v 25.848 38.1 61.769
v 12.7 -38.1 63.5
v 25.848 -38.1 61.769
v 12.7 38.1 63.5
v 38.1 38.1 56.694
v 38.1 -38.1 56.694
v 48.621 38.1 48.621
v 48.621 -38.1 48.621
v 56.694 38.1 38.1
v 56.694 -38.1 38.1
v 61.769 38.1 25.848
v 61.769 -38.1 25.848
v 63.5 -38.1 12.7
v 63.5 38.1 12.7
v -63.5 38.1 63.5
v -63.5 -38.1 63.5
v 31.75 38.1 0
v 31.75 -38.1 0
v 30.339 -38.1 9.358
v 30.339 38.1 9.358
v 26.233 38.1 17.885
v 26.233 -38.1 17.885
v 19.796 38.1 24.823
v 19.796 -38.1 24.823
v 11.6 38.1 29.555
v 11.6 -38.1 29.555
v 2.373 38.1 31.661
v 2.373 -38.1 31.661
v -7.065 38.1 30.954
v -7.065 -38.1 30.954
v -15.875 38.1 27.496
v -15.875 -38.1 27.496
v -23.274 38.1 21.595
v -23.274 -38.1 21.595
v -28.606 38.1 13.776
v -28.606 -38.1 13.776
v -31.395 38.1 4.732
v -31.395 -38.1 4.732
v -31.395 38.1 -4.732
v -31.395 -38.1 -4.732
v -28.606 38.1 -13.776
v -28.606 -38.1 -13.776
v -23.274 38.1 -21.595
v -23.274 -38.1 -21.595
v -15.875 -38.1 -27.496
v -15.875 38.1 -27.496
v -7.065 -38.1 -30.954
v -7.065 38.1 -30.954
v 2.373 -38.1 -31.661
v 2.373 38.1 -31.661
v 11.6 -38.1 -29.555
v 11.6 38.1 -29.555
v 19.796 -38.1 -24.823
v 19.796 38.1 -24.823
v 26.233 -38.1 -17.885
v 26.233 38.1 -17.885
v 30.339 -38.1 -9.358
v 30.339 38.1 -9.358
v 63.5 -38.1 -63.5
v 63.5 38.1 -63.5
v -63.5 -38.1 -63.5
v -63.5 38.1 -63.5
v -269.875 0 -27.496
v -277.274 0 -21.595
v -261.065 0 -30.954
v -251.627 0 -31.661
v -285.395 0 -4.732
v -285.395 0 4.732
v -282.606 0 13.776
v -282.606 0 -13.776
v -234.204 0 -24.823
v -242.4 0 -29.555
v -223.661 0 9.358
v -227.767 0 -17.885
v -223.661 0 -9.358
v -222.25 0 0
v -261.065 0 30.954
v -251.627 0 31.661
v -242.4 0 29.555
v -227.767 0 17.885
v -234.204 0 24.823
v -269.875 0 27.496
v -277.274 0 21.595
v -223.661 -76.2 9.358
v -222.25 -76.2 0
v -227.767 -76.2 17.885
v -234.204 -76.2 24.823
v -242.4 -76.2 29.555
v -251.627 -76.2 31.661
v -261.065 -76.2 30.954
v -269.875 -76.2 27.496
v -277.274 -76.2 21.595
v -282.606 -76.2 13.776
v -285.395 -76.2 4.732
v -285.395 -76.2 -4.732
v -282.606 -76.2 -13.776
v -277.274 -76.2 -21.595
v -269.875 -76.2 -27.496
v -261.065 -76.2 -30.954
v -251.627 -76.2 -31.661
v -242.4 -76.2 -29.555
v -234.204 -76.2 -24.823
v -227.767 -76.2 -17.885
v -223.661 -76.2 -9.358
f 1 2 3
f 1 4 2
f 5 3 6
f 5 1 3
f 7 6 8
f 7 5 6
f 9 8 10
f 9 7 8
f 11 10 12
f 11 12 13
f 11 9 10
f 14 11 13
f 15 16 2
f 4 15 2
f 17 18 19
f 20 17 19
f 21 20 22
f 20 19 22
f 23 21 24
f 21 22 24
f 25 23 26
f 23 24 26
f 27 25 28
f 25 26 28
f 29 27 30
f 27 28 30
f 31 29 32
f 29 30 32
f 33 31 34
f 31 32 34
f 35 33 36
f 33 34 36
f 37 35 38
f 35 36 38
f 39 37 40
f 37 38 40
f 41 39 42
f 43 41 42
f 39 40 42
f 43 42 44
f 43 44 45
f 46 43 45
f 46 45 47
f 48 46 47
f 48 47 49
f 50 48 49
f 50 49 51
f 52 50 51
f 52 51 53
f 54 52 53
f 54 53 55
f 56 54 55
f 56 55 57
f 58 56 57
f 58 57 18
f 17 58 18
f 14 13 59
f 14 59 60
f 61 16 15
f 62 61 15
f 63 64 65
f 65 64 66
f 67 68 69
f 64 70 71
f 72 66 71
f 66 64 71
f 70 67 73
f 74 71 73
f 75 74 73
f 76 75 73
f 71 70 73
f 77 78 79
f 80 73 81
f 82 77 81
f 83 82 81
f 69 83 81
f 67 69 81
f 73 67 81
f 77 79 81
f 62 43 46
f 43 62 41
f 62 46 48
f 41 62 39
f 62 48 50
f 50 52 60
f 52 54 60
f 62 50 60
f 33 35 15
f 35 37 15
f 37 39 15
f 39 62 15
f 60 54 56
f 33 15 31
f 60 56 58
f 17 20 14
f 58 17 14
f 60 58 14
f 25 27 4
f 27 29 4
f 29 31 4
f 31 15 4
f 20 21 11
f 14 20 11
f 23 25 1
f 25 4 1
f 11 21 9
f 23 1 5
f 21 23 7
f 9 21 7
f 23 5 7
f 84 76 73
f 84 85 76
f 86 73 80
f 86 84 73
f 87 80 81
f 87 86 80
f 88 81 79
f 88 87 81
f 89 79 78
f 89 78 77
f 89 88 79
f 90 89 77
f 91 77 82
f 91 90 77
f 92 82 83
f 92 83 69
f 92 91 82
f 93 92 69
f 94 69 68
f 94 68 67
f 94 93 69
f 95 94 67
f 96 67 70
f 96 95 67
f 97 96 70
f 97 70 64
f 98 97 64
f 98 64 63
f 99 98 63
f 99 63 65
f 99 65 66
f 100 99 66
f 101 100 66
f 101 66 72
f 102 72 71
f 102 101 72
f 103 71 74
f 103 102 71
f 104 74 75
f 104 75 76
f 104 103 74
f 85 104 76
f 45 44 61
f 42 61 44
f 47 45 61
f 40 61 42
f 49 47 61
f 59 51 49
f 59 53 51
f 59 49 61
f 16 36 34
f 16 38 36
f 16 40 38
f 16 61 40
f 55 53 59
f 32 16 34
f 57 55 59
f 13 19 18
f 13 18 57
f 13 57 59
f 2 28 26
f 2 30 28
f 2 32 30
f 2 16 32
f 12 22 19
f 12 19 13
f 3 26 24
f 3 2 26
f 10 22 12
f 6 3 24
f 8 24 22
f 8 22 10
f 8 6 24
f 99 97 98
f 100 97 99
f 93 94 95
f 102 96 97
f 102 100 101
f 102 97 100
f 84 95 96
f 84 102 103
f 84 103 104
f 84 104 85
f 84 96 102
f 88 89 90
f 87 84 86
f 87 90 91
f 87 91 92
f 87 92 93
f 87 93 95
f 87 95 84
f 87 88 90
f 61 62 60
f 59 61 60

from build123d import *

# Parameters (mm, degrees)
F0_W     = 127
F0_H     = 76.2
F1_DEPTH = 63.5
F2_R     = 50.8
F3_R     = 31.75
F4_DEPTH = 76.201
F5_R     = 31.75
F6_DEPTH = 38.1


with BuildPart() as f1:
    # F0 (on Top) → F1 (new body, symmetric)
    with BuildSketch(Plane.XY):
        Rectangle(F0_W, F0_H)
    extrude(amount=F1_DEPTH, both=True)

    # F2
    f2_edges = [f1.edges().sort_by_distance(p)[0] for p in [
        (63.5, 0, 63.5),
    ]]
    fillet(f2_edges, radius=F2_R)

    # F3 (on face) → F4 (cut, through all)
    with BuildSketch(Plane.XZ.offset(38.1)):
        Circle(F3_R)
    extrude(amount=-F4_DEPTH, mode=Mode.SUBTRACT)


with BuildPart() as f6:
    # F5 (on face) → F6 (new body, symmetric)
    with BuildSketch(Plane.XZ.offset(38.1)):
        with Locations((-254, 0)):
            Circle(F5_R)
    extrude(amount=F6_DEPTH, both=True)


solid = Compound([f1.part, f6.part])
